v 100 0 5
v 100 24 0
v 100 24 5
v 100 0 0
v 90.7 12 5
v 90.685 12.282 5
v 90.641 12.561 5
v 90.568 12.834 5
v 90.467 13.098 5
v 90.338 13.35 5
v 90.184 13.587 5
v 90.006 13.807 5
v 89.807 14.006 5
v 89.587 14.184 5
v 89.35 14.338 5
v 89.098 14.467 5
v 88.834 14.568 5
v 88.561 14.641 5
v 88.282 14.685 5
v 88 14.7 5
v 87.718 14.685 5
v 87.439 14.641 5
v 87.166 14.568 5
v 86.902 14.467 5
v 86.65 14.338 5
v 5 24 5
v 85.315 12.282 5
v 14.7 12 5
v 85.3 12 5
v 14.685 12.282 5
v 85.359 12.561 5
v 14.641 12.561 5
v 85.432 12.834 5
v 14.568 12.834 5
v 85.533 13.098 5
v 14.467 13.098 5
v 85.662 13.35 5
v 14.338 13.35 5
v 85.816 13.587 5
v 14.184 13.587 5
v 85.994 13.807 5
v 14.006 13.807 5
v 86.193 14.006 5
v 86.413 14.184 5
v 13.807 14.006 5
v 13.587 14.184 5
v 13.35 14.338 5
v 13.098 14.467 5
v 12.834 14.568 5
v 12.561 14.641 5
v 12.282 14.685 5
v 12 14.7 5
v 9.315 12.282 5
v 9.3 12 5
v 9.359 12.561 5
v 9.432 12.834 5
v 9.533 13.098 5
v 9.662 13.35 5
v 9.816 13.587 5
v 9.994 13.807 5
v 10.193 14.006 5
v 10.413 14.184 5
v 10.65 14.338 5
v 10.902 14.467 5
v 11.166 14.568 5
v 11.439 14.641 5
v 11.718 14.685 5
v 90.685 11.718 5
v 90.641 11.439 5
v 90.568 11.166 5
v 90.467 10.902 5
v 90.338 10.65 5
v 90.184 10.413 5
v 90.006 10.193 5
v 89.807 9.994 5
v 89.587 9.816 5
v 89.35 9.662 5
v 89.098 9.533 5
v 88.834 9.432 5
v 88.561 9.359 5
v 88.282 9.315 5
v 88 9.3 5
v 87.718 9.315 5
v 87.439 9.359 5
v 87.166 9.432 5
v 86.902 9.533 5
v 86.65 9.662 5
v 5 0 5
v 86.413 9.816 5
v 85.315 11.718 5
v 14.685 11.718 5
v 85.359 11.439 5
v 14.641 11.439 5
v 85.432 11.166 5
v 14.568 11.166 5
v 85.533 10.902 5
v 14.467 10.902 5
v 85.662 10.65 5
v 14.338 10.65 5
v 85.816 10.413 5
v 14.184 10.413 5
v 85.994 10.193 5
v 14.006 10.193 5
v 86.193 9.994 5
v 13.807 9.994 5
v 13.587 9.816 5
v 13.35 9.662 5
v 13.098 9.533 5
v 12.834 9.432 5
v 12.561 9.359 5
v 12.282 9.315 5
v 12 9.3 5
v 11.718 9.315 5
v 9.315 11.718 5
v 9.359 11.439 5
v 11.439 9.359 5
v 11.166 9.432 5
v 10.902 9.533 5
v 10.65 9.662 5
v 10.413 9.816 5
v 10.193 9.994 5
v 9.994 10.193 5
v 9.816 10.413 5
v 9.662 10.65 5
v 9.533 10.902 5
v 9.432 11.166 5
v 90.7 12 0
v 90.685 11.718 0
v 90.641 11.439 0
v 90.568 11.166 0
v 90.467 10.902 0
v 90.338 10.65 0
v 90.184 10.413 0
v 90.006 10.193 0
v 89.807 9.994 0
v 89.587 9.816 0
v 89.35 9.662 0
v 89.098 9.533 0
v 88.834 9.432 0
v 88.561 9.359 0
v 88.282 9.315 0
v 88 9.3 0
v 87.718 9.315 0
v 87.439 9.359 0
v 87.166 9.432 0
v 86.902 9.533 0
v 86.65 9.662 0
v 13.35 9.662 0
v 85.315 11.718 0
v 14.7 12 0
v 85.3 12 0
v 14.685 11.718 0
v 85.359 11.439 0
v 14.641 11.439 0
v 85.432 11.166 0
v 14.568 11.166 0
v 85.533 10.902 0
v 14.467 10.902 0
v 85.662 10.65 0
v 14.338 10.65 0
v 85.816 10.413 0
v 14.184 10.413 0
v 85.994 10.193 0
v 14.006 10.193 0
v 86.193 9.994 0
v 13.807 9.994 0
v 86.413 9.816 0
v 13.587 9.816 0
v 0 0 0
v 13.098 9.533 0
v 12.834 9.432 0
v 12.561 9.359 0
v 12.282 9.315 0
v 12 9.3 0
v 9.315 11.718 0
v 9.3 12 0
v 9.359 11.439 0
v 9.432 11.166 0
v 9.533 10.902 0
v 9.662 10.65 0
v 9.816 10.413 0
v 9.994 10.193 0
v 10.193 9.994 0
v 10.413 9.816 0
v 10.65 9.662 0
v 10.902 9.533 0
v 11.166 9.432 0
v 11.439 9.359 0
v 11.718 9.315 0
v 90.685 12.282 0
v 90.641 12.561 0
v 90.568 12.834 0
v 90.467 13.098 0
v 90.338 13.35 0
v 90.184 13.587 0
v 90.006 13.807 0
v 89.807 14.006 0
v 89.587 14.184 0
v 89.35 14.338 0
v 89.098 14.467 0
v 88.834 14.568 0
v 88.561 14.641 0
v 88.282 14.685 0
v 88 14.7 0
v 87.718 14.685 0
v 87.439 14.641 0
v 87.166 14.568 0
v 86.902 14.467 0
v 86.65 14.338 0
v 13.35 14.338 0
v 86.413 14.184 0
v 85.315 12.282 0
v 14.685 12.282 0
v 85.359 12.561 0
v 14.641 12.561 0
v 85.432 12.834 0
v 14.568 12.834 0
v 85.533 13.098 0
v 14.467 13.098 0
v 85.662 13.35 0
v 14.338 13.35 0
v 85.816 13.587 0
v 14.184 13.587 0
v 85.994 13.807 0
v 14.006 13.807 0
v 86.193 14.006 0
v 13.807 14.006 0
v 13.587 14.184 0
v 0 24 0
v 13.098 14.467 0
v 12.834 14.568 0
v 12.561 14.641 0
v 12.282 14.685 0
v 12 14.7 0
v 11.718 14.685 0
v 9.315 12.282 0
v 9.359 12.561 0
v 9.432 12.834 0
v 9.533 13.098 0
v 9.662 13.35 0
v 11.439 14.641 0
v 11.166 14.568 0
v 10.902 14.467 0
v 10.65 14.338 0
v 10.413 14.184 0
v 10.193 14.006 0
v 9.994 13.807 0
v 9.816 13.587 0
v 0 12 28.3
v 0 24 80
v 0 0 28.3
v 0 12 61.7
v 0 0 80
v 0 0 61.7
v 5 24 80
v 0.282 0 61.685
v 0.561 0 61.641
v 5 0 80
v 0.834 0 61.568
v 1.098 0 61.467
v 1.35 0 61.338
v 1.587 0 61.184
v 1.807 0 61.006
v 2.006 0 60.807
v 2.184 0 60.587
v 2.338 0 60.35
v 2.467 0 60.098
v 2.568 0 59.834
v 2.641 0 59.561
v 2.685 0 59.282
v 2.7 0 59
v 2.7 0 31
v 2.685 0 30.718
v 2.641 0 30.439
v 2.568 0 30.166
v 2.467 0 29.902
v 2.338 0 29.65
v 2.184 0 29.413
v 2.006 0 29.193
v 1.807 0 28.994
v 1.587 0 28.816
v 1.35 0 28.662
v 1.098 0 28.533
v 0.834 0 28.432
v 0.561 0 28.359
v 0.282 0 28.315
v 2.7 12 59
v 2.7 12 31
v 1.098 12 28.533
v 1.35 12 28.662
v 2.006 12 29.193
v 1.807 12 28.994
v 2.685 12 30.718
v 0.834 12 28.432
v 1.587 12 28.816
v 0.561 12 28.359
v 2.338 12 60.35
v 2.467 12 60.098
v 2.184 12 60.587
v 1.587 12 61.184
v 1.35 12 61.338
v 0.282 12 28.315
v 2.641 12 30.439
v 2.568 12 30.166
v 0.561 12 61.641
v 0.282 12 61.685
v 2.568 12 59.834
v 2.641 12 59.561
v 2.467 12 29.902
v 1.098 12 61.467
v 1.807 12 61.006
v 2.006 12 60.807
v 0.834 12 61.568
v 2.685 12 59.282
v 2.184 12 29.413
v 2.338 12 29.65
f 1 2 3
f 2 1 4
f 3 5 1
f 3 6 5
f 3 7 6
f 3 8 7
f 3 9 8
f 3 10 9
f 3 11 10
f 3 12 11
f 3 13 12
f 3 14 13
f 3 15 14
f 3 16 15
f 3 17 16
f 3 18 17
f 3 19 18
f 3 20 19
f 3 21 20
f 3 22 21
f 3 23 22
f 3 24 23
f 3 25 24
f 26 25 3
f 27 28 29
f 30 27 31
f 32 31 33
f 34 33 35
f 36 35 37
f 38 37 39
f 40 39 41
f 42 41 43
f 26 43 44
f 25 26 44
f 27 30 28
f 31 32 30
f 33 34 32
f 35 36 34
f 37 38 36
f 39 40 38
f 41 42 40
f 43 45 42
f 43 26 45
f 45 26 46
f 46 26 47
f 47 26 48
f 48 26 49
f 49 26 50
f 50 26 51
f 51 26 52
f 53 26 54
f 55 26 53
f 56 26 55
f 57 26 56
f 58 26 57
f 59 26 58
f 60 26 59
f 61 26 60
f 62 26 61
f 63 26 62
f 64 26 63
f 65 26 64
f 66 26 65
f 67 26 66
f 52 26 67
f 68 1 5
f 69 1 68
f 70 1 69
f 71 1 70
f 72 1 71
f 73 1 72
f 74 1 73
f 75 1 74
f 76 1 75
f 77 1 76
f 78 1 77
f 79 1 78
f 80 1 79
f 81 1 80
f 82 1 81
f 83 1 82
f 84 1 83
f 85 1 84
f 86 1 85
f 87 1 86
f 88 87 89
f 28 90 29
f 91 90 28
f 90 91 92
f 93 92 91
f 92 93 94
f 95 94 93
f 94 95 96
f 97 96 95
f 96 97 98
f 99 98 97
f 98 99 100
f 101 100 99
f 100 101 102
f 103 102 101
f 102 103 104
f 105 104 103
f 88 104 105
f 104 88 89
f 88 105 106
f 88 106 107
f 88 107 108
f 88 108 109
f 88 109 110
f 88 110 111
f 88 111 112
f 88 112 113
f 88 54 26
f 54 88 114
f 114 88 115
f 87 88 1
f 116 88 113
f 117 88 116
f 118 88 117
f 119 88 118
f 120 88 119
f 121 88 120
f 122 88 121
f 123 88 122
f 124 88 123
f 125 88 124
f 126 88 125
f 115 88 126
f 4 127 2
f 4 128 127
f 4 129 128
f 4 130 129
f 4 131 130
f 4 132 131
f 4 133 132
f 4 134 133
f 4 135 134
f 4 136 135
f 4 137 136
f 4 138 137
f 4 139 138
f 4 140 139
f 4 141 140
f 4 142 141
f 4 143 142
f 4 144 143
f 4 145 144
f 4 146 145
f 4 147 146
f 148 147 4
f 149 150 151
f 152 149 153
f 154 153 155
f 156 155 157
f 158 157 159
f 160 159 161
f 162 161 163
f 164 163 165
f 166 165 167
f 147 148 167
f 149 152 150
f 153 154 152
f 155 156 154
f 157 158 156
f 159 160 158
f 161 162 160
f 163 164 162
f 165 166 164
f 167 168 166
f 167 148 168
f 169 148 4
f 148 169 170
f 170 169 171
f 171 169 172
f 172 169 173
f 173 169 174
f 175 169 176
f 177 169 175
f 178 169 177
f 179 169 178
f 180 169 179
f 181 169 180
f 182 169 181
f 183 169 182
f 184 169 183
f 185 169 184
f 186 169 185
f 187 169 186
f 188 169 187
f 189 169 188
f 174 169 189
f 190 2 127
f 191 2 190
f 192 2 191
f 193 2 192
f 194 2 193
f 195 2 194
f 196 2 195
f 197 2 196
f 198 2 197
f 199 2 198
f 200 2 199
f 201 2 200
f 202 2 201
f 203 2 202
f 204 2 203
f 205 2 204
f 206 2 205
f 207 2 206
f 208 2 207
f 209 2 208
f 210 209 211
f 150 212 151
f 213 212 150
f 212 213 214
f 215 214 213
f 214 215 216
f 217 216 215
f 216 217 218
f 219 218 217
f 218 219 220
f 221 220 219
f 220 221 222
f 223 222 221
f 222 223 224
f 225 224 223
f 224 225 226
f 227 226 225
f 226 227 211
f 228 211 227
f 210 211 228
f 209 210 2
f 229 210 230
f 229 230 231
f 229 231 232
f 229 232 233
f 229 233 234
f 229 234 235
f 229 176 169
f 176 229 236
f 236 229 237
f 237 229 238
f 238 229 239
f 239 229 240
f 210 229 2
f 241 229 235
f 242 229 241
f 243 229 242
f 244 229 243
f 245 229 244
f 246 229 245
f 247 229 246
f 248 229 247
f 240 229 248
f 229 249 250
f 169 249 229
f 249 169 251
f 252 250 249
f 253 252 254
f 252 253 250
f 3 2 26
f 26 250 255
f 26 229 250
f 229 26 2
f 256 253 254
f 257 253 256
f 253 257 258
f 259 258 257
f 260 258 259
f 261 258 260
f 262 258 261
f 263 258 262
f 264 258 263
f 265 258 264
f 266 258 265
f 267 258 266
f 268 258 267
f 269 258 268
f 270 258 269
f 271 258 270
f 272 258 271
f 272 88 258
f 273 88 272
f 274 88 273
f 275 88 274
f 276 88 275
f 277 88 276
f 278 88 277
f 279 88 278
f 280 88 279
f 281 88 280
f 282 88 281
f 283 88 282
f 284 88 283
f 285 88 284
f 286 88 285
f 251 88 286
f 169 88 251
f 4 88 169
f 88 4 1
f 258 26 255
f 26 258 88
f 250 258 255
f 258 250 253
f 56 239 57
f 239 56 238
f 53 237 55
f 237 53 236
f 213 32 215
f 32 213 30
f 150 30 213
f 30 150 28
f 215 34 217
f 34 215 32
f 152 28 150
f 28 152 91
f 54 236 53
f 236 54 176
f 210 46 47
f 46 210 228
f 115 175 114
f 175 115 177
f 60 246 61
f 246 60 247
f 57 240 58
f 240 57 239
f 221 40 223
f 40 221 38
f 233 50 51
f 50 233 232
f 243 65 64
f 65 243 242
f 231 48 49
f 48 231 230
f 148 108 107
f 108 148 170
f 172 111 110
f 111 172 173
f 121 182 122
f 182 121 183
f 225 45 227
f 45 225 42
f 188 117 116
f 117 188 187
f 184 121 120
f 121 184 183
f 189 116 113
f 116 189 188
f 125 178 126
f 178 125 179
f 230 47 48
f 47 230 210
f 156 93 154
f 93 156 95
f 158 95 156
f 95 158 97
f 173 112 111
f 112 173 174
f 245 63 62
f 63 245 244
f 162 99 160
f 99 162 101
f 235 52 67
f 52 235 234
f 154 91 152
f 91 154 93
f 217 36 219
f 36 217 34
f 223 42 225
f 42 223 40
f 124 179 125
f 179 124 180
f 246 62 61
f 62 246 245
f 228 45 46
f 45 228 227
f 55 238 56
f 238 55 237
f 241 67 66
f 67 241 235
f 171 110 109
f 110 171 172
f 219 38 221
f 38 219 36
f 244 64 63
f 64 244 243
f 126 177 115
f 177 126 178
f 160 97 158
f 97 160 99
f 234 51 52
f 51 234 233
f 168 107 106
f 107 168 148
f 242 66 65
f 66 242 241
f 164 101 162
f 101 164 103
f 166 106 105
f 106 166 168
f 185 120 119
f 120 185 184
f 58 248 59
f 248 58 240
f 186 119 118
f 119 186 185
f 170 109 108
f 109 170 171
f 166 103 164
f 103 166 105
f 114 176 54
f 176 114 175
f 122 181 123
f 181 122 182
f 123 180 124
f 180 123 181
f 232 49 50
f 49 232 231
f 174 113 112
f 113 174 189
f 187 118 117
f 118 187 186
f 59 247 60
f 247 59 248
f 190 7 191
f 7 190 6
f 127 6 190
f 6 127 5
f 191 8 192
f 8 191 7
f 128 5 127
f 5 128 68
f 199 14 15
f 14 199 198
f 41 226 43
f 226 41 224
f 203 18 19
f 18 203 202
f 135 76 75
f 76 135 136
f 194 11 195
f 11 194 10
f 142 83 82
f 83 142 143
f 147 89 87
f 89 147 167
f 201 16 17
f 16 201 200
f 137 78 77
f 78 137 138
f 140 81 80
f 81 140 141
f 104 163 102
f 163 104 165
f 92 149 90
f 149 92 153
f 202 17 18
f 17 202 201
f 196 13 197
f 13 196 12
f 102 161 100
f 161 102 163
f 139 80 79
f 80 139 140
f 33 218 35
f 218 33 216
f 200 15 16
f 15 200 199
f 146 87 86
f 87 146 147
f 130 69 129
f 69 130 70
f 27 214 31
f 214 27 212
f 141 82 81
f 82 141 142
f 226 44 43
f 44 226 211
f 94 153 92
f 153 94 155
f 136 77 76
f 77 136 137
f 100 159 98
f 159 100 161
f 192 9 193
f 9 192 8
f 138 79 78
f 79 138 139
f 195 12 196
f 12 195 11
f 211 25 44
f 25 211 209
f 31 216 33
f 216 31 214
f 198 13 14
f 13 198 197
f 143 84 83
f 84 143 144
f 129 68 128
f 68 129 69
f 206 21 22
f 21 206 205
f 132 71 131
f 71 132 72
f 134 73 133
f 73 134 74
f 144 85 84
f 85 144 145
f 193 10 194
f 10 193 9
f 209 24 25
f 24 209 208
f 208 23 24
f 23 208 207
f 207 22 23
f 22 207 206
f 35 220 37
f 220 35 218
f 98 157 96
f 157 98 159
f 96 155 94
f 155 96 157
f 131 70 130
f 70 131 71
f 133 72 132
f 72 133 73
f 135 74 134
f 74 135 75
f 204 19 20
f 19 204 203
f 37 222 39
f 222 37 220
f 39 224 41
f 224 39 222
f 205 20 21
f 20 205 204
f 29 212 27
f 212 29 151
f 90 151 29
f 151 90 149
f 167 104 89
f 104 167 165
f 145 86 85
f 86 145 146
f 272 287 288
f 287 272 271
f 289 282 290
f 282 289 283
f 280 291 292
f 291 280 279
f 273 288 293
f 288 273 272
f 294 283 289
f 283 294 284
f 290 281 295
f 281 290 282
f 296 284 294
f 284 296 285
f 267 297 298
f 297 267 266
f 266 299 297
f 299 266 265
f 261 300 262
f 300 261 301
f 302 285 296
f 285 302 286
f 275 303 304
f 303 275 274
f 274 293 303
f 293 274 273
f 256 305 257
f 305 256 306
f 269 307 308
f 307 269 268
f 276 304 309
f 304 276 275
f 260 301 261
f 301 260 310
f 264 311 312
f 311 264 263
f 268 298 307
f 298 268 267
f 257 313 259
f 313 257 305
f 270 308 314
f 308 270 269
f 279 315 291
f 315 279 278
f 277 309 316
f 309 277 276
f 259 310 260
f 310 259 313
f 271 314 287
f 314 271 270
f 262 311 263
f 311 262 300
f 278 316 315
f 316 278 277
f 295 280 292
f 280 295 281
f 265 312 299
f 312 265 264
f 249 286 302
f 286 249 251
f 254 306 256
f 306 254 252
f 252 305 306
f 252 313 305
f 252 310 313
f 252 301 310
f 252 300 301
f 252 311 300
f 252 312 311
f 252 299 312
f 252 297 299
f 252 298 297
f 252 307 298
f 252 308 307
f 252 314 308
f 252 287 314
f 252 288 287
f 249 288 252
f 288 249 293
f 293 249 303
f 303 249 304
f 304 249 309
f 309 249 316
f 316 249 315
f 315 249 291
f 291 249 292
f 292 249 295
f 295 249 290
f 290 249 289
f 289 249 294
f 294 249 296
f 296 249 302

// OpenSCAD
// Adjustable L bracket with upright slot.
$fn = 60;
eps = 0.02;
base_l = 100;
upright_h = 80;
width = 24;
thickness = 5;
slot_l = 28;
module vertical_slot() { hull() { translate([0,width/2,thickness+upright_h/2-slot_l/2]) rotate([90,0,0]) cylinder(d=5.4,h=width+2*eps); translate([0,width/2,thickness+upright_h/2+slot_l/2]) rotate([90,0,0]) cylinder(d=5.4,h=width+2*eps); } }
difference() {
    union() { cube([base_l,width,thickness]); cube([thickness,width,upright_h]); }
    for(x=[12,base_l-12]) translate([x,width/2,-eps]) cylinder(d=5.4,h=thickness+2*eps);
    vertical_slot();
}
